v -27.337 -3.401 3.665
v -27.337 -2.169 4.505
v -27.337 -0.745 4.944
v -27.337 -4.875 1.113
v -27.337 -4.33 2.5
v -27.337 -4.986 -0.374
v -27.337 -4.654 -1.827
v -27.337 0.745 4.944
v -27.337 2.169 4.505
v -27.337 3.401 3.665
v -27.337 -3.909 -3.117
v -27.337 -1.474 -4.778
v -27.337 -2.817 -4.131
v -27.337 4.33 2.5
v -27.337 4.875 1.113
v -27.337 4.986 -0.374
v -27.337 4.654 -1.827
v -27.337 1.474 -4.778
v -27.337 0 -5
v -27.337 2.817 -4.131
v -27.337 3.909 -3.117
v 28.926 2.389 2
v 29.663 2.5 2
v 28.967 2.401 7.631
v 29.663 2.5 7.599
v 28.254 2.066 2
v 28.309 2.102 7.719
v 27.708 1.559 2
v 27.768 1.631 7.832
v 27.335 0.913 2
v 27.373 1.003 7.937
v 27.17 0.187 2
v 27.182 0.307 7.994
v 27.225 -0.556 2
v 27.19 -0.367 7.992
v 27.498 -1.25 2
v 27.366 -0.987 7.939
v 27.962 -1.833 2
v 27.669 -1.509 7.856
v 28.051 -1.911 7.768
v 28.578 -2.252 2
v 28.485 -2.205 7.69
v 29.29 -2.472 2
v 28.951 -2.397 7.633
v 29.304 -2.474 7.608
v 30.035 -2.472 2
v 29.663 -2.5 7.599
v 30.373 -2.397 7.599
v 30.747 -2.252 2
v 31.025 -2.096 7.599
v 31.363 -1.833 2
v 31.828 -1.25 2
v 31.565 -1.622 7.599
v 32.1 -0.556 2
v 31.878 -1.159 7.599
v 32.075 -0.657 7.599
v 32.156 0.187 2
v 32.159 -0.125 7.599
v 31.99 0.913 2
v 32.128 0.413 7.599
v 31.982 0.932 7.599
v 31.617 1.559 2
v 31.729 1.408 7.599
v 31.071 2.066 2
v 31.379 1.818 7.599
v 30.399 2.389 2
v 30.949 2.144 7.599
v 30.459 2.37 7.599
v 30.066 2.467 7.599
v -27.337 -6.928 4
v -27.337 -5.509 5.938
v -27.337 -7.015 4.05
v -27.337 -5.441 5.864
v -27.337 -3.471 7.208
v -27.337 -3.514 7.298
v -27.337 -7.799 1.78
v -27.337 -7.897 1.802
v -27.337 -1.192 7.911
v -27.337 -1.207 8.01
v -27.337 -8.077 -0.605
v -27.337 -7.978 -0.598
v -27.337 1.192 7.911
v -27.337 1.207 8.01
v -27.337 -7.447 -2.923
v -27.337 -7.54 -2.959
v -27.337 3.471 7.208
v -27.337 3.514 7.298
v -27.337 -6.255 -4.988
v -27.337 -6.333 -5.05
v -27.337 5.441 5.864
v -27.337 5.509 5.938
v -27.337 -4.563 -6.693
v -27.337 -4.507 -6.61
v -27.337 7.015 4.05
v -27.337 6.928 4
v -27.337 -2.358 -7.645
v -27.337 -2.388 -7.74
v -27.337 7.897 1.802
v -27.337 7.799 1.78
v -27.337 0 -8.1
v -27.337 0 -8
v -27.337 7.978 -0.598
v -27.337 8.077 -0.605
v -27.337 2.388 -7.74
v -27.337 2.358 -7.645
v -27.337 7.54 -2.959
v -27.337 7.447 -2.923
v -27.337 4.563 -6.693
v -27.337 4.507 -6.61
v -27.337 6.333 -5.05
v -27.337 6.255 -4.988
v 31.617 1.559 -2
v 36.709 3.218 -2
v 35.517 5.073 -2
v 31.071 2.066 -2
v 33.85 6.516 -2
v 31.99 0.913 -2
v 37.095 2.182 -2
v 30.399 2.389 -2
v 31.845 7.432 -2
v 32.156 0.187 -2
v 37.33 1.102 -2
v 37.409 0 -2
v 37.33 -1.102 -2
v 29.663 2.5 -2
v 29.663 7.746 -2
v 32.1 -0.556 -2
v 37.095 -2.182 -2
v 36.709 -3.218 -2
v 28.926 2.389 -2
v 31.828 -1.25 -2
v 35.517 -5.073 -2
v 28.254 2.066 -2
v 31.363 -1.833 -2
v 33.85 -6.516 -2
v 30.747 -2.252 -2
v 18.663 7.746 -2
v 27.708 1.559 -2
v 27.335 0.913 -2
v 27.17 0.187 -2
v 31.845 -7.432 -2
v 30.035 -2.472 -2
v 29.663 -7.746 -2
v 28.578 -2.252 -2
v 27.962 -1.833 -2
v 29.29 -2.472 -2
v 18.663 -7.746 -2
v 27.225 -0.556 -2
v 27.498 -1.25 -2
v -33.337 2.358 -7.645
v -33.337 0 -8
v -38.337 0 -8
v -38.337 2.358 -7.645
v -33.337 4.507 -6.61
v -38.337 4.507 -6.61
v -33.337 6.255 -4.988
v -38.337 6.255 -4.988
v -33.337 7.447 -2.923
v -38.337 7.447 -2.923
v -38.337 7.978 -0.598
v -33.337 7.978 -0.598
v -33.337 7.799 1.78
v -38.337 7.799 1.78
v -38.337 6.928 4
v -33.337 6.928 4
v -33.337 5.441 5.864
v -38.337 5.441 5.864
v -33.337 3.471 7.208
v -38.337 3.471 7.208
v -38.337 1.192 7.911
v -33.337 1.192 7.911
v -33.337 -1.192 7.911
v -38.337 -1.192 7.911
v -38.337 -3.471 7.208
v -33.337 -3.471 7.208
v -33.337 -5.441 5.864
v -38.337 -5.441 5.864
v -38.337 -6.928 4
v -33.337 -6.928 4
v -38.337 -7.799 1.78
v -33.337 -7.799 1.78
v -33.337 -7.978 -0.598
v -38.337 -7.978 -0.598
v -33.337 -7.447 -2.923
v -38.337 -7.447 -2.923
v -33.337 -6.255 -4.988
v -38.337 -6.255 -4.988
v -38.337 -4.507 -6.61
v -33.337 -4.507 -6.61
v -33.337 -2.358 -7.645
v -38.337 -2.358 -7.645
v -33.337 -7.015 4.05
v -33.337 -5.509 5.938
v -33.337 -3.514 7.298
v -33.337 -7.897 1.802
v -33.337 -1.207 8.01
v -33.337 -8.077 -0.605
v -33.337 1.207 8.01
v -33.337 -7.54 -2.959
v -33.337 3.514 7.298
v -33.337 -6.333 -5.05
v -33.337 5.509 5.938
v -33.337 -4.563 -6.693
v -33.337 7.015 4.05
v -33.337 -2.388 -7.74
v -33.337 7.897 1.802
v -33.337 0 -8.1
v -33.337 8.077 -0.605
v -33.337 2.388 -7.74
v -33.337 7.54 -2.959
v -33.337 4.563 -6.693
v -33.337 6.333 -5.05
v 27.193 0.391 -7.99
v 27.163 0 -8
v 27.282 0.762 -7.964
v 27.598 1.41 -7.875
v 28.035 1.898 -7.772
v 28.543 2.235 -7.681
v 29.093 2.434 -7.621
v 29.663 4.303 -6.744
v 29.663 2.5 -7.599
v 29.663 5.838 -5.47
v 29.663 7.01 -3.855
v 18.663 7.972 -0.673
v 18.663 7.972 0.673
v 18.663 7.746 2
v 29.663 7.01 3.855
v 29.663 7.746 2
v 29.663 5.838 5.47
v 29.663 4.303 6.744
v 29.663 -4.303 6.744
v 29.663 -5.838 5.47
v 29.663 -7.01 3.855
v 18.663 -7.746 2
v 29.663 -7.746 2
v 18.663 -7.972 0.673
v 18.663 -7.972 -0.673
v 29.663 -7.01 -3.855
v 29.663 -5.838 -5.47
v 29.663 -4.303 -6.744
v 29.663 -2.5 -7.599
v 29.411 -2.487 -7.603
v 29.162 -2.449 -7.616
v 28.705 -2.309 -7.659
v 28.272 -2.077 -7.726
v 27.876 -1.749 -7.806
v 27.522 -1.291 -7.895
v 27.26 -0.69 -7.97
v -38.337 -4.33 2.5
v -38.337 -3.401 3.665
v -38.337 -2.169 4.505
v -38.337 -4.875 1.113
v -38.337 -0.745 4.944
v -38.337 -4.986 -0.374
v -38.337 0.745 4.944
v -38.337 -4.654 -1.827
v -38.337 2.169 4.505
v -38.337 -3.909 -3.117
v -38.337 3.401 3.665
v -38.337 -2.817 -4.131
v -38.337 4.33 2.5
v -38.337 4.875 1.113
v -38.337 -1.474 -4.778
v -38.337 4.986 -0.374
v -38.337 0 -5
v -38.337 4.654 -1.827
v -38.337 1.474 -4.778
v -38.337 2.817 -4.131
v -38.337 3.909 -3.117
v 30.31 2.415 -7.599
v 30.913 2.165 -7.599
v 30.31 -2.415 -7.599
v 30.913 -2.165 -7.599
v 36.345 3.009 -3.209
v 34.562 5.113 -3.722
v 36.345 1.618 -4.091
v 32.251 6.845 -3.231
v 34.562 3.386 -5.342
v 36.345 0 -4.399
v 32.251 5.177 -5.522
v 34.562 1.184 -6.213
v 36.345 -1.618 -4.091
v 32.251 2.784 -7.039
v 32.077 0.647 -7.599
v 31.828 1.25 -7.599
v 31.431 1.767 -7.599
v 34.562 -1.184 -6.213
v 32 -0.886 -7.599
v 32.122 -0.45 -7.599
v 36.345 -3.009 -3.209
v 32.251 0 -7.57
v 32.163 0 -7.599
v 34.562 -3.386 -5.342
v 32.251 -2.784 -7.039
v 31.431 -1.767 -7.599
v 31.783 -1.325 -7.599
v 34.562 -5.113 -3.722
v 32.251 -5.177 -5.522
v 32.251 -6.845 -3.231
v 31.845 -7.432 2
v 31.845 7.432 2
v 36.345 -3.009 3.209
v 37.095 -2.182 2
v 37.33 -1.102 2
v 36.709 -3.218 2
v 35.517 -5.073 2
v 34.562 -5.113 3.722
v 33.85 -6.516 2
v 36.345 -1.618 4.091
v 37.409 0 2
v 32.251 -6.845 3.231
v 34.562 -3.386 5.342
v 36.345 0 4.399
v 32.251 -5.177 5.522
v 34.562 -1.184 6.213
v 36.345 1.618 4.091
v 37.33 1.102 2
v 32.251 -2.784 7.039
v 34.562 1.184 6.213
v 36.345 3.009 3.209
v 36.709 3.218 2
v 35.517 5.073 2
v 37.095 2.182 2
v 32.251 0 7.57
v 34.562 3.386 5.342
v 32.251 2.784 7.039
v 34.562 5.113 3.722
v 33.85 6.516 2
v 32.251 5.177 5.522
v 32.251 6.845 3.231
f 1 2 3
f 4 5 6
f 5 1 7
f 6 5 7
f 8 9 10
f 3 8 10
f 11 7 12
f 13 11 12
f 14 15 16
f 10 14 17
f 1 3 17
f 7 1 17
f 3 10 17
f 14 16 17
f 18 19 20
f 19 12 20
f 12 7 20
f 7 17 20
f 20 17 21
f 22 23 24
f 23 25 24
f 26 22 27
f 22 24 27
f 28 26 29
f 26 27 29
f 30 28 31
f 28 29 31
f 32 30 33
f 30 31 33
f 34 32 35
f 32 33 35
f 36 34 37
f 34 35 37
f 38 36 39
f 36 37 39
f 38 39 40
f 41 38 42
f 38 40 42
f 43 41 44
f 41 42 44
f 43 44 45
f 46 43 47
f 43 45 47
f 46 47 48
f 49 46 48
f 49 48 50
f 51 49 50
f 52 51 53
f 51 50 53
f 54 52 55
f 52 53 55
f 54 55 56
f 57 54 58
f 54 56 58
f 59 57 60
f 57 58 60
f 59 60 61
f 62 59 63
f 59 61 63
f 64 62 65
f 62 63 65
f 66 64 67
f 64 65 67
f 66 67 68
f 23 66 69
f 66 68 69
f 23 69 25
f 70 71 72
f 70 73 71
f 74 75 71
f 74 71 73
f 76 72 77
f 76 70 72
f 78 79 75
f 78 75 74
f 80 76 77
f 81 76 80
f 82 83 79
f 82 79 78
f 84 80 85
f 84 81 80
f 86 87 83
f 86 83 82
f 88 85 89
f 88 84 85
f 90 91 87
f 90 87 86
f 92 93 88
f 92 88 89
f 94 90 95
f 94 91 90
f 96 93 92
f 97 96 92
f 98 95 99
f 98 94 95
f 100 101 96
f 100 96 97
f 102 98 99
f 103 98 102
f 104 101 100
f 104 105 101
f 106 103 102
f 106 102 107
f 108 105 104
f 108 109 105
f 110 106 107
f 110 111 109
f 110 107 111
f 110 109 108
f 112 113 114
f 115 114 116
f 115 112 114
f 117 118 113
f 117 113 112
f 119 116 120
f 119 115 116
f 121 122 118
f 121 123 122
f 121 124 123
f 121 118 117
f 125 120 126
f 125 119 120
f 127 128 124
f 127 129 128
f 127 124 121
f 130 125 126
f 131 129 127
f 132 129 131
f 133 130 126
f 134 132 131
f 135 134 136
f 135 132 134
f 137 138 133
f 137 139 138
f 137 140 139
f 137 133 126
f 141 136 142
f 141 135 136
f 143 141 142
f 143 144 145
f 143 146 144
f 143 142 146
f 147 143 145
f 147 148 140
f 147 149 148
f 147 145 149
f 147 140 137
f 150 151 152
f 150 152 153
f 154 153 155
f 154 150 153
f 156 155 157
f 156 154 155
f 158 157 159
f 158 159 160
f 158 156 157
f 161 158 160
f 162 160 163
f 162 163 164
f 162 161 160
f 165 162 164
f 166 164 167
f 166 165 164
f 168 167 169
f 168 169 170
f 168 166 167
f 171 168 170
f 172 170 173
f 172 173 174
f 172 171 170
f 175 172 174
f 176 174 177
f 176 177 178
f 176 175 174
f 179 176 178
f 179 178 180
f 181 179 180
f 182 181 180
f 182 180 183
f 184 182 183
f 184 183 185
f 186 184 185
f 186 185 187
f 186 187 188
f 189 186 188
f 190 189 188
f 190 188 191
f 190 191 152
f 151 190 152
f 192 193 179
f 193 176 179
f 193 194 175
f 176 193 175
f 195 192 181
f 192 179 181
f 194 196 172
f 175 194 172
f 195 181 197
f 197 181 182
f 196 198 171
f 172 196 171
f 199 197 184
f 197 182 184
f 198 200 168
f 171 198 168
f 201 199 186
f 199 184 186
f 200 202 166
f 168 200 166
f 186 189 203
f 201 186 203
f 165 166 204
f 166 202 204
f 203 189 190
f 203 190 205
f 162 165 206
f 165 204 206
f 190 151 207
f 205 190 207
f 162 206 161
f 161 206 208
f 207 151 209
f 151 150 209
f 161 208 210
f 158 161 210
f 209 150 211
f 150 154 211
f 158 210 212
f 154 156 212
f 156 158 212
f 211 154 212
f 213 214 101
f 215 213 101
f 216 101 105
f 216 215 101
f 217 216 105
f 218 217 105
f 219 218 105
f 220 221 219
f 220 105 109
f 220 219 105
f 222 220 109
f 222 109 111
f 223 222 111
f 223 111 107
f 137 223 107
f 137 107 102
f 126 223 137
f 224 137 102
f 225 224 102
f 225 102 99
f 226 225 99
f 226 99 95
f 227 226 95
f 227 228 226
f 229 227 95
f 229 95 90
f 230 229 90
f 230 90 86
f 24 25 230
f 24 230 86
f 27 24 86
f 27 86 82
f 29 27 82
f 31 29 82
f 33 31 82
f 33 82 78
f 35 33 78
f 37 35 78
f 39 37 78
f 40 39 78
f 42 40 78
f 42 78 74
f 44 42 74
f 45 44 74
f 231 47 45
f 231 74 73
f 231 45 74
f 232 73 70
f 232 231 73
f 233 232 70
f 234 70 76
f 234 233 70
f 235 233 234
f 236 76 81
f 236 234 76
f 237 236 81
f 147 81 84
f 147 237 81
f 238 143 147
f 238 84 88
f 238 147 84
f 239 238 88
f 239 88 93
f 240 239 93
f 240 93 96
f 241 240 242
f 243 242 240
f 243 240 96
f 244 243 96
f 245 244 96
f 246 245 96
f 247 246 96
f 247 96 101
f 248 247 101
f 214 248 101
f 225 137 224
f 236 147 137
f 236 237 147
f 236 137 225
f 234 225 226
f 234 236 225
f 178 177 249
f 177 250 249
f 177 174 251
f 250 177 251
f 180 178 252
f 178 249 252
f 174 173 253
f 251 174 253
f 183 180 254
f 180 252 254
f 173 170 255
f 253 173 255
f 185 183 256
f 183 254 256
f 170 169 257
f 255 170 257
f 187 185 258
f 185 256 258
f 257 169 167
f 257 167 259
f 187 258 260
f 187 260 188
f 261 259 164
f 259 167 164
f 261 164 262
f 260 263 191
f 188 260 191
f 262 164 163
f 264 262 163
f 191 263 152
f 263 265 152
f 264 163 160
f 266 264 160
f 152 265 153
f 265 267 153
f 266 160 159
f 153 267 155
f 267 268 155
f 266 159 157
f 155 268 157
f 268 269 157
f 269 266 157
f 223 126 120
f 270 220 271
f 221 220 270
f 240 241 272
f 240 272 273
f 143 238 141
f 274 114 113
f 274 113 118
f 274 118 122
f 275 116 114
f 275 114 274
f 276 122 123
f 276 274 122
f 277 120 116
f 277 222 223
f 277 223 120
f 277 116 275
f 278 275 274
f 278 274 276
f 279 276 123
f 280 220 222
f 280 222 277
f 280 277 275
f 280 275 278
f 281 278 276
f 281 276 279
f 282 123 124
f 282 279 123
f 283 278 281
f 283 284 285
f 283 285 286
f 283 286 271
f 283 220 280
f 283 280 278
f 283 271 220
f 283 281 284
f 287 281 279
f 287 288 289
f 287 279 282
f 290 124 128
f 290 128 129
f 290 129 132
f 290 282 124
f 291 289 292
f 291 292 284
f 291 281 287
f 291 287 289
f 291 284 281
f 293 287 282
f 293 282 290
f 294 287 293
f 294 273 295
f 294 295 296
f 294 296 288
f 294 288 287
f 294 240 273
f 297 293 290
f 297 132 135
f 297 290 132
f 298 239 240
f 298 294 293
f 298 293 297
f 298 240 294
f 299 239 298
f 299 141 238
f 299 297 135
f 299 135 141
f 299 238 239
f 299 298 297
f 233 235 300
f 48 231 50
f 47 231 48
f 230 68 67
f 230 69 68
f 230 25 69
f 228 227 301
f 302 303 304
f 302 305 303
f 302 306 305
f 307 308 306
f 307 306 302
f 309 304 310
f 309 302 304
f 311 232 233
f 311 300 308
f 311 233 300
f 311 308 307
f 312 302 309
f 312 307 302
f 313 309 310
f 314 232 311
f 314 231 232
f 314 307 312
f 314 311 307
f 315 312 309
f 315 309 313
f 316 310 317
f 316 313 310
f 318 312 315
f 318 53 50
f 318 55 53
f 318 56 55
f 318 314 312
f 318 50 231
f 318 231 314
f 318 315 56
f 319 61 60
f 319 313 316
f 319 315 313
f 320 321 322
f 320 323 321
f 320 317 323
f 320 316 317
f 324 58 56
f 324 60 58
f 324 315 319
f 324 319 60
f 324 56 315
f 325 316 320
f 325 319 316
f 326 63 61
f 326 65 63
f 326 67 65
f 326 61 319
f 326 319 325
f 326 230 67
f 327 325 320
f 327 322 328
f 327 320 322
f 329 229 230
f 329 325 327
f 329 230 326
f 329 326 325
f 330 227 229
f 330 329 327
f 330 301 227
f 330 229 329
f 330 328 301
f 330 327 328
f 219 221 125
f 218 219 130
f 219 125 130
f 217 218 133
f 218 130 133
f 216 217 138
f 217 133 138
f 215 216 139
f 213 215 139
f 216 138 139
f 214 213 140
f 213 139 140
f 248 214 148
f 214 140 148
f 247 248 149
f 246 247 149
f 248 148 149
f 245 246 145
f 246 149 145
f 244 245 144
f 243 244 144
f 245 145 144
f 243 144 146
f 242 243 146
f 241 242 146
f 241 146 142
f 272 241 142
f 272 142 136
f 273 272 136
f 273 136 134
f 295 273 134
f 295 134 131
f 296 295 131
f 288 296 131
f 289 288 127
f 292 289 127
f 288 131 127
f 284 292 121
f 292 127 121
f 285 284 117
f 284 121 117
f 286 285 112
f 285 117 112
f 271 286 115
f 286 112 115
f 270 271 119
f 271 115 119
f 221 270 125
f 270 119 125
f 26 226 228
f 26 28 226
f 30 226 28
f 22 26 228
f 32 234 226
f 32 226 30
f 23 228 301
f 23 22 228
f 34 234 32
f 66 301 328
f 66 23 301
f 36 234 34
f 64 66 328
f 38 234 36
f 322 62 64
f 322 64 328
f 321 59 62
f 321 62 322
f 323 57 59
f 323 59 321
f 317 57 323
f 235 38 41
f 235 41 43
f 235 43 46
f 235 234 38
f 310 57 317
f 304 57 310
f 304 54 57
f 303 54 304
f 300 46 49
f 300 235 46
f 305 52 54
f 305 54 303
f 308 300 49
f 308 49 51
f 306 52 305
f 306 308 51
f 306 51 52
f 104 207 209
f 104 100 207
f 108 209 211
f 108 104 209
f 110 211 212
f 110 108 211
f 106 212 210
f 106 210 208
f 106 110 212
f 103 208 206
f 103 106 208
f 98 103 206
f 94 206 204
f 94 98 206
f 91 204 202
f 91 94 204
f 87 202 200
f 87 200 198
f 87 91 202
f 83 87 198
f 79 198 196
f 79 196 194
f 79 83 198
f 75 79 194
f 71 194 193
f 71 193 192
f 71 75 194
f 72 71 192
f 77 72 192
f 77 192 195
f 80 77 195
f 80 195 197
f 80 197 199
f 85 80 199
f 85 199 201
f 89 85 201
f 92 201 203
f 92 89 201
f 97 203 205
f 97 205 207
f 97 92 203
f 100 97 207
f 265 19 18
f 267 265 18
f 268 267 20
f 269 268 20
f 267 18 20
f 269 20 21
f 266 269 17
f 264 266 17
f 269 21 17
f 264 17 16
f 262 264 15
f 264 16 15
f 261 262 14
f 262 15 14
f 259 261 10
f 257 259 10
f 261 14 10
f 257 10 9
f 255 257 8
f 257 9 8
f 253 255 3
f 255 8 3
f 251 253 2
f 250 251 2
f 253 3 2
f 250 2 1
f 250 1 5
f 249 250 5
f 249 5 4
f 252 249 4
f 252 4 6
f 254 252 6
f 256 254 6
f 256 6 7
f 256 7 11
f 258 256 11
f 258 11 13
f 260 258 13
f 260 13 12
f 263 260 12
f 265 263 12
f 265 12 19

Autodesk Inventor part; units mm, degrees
ref_plane "YZ Plane" through (0, 0, 0) normal (1, 0, 0) x (0, 1, 0)
ref_plane "XZ Plane" through (0, 0, 0) normal (0, 1, 0) x (-1, 0, 0)
sketch "Boceto1" plane through (0, 0, 0) normal (0, 1, 0) x (-1, 0, 0)
  line L0 (52.4225, 0) -> (-52.4225, 0)
  line L1 (38.3374, 0) -> (38.3374, -8)
  line L2 (38.3374, -8) -> (-29.6626, -8)
  line L3 (-29.6626, -8) -> (-29.6626, 0)
  line L4 (38.3374, -5) -> (27.3374, -5)
  line L5 (27.3374, -5) -> (27.3374, 0)
  line L6 (33.3374, -8) -> (33.3374, -8.1)
  line L7 (33.3374, -8.1) -> (27.3374, -8.1)
  line L8 (27.3374, -8.1) -> (27.3374, -8)
  arc A0 (-37.6626, 0) -> (-29.6626, -8) centre (-29.6626, 0) ccw
  line L9 (-18.6626, 2) -> (-37.6626, 2)
  line L10 (-37.6626, 2) -> (-37.6626, -2)
  line L11 (-37.6626, -2) -> (-18.6626, -2)
  line L12 (-18.6626, -2) -> (-18.6626, 2)
  point P0 (0, 0)
  point P1 (0, 0)
  point P2 (-29.6626, -10)
  dimension "d0" = 68
  dimension "d1" = 16
  dimension "d2" = 10
  dimension "d3" = 11
  dimension "d4" = 5
  dimension "d5" = 6
  dimension "d6" = 16.2
  dimension "d8" = 8
  dimension "d9" = 19
  dimension "d10" = 4
  dimension "d11" = 10
  dimension "d12" = 38.3374
  dimension "d13" = 14.0851
  dimension "d14" = 68
revolve "Revolución1" add sketch "Boceto1" angle 360 about axis through (-52.4225, 0, 0) along (1, 0, 0) contours L5 L4 L1 L2 L3 L11 L12 L0 | L12 L11 L3 L0 | L3 L11 A0 L0 | L6 L7 L8 L2 | L3 A0 L11
extrude "Extrusión1" cut sketch "Boceto1" along normal through all both and the other way through all contours L12 L11 L3 L0 | L0 L10 L9 L12 | L3 L11 A0 L0 | A0 L11 L10
ref_plane "Plano de trabajo1" through (29.6626, 0, -10) normal (0, 0, 1) x (1, 0, 0)
sketch "Boceto2" plane through (29.6626, 0, -10) normal (0, 0, 1) x (1, 0, 0)
  line L0 (-11, 7.746) -> (0, 7.746) projected
  line L1 (0, -7.746) -> (0, 7.746) projected
  line L2 (0, -7.746) -> (-11, -7.746) projected
  line L3 (-11, -7.746) -> (-11, -7.746) projected
  line L4 (-11, -7.746) -> (0, -7.746) projected
  line L5 (0, 7.746) -> (0, -7.746) projected
  line L6 (0, 7.746) -> (-11, 7.746) projected
  line L7 (-11, 7.746) -> (-11, 7.746) projected
  line L8 (-57, -8) -> (-57, 8) projected
  arc A0 (0, -7.746) -> (0, 7.746) centre (0, 0) ccw projected
  line L9 (0, -7.746) -> (0, 7.746) projected
  point P0 (-29.6626, 0)
hole "Agujero1" at (29.6626, 0, -10) direction (0, 0, 1) diameter 5 end through all
properties part number "1 -HUDSON-8-31B-TDR HAND PUMP"
